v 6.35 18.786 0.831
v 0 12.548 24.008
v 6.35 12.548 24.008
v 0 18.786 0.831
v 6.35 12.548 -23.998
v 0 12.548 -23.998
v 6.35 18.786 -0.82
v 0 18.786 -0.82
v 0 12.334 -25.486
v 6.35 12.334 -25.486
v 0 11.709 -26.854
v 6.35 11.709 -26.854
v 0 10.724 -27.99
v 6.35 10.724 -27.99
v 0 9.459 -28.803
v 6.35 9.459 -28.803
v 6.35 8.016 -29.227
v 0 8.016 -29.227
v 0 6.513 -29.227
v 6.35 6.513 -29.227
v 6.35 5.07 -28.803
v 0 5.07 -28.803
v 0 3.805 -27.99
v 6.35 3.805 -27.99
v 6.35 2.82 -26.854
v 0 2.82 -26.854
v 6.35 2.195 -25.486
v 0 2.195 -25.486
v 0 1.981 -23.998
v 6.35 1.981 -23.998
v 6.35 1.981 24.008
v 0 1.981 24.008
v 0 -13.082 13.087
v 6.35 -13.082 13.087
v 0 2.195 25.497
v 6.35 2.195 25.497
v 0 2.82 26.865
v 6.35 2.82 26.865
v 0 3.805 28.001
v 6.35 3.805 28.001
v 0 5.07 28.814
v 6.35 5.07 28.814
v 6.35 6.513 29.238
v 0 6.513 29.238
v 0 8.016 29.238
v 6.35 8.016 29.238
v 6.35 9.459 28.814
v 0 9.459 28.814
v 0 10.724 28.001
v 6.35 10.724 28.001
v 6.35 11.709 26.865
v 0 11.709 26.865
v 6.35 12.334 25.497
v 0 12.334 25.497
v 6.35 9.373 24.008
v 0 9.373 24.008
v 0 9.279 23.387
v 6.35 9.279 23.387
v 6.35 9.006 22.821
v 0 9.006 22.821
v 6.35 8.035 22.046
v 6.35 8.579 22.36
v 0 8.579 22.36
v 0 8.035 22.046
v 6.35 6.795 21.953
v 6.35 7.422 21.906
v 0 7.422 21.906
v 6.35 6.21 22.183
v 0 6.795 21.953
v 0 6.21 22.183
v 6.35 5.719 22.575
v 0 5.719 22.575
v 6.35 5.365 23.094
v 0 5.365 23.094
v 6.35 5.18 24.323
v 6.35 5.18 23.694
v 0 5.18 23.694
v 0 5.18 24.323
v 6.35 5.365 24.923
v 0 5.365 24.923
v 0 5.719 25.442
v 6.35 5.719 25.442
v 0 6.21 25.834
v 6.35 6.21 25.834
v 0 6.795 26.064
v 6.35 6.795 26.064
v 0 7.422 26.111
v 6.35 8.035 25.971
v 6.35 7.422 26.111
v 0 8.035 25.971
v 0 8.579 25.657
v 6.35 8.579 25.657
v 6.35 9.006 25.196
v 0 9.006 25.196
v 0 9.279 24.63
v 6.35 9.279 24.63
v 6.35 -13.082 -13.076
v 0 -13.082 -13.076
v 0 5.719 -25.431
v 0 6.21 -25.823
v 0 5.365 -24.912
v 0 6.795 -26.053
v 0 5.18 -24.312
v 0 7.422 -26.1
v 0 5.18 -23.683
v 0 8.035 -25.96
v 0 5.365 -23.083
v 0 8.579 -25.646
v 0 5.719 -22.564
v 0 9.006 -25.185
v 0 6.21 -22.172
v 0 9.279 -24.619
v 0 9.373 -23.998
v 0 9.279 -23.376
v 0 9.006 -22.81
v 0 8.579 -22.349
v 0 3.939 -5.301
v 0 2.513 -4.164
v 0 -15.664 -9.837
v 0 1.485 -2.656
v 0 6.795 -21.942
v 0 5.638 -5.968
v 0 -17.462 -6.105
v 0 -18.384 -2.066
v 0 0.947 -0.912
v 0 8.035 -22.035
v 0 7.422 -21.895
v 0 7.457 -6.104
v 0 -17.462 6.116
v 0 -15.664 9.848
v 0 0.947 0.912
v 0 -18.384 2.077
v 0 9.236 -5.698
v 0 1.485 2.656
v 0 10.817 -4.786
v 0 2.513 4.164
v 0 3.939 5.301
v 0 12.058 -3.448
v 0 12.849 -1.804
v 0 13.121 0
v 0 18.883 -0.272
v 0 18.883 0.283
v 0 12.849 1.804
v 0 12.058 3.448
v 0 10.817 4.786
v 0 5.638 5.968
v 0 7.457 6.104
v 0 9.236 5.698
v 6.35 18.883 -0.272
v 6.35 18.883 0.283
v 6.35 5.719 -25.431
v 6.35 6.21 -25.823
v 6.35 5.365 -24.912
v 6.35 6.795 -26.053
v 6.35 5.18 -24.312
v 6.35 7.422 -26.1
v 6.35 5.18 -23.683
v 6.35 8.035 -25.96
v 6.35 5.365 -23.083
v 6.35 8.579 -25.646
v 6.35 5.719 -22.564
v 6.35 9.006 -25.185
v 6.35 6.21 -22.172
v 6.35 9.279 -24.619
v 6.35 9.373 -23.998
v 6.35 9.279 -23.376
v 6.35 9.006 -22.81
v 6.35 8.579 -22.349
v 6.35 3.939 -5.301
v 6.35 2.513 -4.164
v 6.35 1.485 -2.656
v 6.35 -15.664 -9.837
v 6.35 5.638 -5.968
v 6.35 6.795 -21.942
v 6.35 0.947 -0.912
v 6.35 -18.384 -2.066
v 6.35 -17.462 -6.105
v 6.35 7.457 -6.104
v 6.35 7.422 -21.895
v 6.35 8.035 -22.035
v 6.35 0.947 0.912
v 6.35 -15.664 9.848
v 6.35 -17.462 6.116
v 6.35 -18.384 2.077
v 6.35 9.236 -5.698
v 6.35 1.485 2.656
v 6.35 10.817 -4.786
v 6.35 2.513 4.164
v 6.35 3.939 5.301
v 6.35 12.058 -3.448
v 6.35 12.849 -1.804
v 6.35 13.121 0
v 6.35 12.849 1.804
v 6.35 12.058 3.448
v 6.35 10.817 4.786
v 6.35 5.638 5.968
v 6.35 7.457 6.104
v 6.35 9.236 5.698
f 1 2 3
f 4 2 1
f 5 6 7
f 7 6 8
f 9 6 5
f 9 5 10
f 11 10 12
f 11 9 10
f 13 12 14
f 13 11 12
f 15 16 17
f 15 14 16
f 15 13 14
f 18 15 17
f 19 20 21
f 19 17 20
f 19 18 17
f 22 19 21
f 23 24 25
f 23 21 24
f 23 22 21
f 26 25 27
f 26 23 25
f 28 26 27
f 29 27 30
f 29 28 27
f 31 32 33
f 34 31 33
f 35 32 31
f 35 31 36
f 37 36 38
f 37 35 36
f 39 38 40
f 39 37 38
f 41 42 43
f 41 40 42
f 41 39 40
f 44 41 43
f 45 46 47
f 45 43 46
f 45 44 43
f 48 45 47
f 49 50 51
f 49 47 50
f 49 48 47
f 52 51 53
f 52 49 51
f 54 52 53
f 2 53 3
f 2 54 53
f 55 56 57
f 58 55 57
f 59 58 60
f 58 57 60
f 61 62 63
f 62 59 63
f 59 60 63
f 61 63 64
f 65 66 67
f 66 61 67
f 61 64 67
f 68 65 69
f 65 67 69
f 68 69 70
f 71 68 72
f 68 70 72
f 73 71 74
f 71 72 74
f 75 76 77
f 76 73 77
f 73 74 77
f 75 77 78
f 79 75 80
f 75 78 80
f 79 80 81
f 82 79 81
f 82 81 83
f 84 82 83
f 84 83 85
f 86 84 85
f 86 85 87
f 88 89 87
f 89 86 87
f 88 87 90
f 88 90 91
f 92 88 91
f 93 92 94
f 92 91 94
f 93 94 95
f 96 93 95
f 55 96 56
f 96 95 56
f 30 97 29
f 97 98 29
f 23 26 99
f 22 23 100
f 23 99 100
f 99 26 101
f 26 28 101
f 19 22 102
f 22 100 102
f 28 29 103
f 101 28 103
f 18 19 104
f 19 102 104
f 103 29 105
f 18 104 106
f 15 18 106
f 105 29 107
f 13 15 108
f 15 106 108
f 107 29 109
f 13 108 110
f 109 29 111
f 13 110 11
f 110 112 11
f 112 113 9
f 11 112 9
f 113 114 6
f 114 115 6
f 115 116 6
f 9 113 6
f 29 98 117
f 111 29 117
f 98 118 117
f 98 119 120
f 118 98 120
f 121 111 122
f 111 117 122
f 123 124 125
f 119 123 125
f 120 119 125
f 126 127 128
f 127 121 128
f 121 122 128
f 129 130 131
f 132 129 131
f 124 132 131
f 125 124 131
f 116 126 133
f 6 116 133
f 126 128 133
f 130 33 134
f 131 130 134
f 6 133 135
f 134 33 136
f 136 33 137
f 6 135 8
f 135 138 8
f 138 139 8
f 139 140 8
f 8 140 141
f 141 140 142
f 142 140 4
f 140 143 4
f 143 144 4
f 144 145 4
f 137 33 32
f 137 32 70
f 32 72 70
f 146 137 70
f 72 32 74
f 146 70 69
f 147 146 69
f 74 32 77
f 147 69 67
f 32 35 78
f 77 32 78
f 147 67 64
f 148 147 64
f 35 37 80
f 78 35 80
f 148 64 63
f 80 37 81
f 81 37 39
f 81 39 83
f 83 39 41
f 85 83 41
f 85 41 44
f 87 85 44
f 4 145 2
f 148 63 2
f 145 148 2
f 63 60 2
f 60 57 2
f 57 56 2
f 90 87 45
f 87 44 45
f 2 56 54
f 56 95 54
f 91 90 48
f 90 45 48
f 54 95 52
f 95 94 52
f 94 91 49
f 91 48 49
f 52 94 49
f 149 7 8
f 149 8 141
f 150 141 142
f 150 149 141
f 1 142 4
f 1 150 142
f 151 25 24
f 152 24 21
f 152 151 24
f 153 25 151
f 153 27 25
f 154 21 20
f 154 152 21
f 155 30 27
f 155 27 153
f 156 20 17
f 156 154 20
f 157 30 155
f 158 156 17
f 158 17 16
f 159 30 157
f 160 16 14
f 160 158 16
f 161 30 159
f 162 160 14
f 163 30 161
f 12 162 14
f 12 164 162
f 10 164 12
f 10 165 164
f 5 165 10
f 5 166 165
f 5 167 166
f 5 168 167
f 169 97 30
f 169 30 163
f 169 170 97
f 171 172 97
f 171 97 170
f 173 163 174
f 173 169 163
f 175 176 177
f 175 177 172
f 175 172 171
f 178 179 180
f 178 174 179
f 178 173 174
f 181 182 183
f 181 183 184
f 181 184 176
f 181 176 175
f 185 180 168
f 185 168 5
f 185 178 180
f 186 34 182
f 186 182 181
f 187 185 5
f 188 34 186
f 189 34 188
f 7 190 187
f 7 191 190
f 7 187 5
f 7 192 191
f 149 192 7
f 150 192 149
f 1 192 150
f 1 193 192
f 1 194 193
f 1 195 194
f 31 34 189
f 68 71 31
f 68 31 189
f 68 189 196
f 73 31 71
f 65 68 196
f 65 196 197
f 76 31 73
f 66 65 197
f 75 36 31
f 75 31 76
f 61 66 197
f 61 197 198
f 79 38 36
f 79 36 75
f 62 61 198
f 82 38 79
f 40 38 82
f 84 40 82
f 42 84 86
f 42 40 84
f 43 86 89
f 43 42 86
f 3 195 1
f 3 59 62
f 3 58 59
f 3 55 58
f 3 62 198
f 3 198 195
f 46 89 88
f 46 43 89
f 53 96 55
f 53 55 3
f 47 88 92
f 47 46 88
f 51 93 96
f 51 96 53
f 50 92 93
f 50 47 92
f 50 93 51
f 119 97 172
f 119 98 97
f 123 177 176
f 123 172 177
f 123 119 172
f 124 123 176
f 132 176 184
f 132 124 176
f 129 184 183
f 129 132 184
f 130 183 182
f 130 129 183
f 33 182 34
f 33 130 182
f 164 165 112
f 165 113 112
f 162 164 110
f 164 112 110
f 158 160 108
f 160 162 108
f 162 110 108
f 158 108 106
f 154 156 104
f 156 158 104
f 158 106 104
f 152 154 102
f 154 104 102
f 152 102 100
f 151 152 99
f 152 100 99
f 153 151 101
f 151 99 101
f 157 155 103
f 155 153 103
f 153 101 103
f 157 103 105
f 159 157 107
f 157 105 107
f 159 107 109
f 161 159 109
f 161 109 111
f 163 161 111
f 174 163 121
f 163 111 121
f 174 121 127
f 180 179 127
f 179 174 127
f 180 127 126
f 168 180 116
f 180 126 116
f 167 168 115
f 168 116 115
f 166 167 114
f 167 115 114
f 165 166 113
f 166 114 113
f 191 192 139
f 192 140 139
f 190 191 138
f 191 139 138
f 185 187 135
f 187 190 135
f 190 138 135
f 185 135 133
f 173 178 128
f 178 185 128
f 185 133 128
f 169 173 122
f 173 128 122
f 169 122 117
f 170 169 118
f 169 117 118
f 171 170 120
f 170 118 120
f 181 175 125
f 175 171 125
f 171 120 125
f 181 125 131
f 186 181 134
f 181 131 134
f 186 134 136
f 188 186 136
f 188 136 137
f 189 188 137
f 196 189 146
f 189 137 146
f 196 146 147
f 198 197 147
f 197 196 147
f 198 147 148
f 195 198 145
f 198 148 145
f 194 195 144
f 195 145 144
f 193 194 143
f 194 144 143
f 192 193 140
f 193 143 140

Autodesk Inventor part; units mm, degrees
ref_plane "YZ Plane" through (0, 0, 0) normal (1, 0, 0) x (0, 1, 0)
ref_plane "XZ Plane" through (0, 0, 0) normal (0, 1, 0) x (-1, 0, 0)
ref_plane "XY Plane" through (0, 0, 0) normal (0, 0, 1) x (1, 0, 0)
sketch "Sketch1" plane through (0, 0, 0) normal (1, 0, 0) x (0, 1, 0)
  circle A0 centre (7.2644, 24.0085) radius 2.1082
  circle A1 centre (7.2644, -23.9975) radius 2.1082
  arc A2 (12.5476, 24.0085) -> (1.9812, 24.0085) centre (7.2644, 24.0085) ccw
  arc A3 (1.9812, -23.9975) -> (12.5476, -23.9975) centre (7.2644, -23.9975) ccw
  line L0 (12.5476, 24.0085) -> (19.008, 0.0055)
  line L1 (12.5476, -23.9975) -> (19.008, 0.0055)
  line L2 (1.9812, 24.0085) -> (-13.0815, 13.087)
  line L3 (-13.0815, -13.0759) -> (1.9812, -23.9975)
  arc A4 (-13.0815, 13.087) -> (-13.0815, -13.0759) centre (0, 0.0055) ccw
  circle A5 centre (7, 0) radius 6.1214
  point P0 (0, 0)
  dimension "d8" = 4.2164
  dimension "d11" = 4.2164
  dimension "d14" = 10.5664
  dimension "d15" = 10.5664
  dimension "d43" = 12.2428
extrude "Extrusion1" add sketch "Sketch1" along normal blind 6.35
fillet "Fillet1" radius 3.175 1 edges at (3.175, 19.008, 0.0055)
properties part number "MotorFixedPositionMount"
